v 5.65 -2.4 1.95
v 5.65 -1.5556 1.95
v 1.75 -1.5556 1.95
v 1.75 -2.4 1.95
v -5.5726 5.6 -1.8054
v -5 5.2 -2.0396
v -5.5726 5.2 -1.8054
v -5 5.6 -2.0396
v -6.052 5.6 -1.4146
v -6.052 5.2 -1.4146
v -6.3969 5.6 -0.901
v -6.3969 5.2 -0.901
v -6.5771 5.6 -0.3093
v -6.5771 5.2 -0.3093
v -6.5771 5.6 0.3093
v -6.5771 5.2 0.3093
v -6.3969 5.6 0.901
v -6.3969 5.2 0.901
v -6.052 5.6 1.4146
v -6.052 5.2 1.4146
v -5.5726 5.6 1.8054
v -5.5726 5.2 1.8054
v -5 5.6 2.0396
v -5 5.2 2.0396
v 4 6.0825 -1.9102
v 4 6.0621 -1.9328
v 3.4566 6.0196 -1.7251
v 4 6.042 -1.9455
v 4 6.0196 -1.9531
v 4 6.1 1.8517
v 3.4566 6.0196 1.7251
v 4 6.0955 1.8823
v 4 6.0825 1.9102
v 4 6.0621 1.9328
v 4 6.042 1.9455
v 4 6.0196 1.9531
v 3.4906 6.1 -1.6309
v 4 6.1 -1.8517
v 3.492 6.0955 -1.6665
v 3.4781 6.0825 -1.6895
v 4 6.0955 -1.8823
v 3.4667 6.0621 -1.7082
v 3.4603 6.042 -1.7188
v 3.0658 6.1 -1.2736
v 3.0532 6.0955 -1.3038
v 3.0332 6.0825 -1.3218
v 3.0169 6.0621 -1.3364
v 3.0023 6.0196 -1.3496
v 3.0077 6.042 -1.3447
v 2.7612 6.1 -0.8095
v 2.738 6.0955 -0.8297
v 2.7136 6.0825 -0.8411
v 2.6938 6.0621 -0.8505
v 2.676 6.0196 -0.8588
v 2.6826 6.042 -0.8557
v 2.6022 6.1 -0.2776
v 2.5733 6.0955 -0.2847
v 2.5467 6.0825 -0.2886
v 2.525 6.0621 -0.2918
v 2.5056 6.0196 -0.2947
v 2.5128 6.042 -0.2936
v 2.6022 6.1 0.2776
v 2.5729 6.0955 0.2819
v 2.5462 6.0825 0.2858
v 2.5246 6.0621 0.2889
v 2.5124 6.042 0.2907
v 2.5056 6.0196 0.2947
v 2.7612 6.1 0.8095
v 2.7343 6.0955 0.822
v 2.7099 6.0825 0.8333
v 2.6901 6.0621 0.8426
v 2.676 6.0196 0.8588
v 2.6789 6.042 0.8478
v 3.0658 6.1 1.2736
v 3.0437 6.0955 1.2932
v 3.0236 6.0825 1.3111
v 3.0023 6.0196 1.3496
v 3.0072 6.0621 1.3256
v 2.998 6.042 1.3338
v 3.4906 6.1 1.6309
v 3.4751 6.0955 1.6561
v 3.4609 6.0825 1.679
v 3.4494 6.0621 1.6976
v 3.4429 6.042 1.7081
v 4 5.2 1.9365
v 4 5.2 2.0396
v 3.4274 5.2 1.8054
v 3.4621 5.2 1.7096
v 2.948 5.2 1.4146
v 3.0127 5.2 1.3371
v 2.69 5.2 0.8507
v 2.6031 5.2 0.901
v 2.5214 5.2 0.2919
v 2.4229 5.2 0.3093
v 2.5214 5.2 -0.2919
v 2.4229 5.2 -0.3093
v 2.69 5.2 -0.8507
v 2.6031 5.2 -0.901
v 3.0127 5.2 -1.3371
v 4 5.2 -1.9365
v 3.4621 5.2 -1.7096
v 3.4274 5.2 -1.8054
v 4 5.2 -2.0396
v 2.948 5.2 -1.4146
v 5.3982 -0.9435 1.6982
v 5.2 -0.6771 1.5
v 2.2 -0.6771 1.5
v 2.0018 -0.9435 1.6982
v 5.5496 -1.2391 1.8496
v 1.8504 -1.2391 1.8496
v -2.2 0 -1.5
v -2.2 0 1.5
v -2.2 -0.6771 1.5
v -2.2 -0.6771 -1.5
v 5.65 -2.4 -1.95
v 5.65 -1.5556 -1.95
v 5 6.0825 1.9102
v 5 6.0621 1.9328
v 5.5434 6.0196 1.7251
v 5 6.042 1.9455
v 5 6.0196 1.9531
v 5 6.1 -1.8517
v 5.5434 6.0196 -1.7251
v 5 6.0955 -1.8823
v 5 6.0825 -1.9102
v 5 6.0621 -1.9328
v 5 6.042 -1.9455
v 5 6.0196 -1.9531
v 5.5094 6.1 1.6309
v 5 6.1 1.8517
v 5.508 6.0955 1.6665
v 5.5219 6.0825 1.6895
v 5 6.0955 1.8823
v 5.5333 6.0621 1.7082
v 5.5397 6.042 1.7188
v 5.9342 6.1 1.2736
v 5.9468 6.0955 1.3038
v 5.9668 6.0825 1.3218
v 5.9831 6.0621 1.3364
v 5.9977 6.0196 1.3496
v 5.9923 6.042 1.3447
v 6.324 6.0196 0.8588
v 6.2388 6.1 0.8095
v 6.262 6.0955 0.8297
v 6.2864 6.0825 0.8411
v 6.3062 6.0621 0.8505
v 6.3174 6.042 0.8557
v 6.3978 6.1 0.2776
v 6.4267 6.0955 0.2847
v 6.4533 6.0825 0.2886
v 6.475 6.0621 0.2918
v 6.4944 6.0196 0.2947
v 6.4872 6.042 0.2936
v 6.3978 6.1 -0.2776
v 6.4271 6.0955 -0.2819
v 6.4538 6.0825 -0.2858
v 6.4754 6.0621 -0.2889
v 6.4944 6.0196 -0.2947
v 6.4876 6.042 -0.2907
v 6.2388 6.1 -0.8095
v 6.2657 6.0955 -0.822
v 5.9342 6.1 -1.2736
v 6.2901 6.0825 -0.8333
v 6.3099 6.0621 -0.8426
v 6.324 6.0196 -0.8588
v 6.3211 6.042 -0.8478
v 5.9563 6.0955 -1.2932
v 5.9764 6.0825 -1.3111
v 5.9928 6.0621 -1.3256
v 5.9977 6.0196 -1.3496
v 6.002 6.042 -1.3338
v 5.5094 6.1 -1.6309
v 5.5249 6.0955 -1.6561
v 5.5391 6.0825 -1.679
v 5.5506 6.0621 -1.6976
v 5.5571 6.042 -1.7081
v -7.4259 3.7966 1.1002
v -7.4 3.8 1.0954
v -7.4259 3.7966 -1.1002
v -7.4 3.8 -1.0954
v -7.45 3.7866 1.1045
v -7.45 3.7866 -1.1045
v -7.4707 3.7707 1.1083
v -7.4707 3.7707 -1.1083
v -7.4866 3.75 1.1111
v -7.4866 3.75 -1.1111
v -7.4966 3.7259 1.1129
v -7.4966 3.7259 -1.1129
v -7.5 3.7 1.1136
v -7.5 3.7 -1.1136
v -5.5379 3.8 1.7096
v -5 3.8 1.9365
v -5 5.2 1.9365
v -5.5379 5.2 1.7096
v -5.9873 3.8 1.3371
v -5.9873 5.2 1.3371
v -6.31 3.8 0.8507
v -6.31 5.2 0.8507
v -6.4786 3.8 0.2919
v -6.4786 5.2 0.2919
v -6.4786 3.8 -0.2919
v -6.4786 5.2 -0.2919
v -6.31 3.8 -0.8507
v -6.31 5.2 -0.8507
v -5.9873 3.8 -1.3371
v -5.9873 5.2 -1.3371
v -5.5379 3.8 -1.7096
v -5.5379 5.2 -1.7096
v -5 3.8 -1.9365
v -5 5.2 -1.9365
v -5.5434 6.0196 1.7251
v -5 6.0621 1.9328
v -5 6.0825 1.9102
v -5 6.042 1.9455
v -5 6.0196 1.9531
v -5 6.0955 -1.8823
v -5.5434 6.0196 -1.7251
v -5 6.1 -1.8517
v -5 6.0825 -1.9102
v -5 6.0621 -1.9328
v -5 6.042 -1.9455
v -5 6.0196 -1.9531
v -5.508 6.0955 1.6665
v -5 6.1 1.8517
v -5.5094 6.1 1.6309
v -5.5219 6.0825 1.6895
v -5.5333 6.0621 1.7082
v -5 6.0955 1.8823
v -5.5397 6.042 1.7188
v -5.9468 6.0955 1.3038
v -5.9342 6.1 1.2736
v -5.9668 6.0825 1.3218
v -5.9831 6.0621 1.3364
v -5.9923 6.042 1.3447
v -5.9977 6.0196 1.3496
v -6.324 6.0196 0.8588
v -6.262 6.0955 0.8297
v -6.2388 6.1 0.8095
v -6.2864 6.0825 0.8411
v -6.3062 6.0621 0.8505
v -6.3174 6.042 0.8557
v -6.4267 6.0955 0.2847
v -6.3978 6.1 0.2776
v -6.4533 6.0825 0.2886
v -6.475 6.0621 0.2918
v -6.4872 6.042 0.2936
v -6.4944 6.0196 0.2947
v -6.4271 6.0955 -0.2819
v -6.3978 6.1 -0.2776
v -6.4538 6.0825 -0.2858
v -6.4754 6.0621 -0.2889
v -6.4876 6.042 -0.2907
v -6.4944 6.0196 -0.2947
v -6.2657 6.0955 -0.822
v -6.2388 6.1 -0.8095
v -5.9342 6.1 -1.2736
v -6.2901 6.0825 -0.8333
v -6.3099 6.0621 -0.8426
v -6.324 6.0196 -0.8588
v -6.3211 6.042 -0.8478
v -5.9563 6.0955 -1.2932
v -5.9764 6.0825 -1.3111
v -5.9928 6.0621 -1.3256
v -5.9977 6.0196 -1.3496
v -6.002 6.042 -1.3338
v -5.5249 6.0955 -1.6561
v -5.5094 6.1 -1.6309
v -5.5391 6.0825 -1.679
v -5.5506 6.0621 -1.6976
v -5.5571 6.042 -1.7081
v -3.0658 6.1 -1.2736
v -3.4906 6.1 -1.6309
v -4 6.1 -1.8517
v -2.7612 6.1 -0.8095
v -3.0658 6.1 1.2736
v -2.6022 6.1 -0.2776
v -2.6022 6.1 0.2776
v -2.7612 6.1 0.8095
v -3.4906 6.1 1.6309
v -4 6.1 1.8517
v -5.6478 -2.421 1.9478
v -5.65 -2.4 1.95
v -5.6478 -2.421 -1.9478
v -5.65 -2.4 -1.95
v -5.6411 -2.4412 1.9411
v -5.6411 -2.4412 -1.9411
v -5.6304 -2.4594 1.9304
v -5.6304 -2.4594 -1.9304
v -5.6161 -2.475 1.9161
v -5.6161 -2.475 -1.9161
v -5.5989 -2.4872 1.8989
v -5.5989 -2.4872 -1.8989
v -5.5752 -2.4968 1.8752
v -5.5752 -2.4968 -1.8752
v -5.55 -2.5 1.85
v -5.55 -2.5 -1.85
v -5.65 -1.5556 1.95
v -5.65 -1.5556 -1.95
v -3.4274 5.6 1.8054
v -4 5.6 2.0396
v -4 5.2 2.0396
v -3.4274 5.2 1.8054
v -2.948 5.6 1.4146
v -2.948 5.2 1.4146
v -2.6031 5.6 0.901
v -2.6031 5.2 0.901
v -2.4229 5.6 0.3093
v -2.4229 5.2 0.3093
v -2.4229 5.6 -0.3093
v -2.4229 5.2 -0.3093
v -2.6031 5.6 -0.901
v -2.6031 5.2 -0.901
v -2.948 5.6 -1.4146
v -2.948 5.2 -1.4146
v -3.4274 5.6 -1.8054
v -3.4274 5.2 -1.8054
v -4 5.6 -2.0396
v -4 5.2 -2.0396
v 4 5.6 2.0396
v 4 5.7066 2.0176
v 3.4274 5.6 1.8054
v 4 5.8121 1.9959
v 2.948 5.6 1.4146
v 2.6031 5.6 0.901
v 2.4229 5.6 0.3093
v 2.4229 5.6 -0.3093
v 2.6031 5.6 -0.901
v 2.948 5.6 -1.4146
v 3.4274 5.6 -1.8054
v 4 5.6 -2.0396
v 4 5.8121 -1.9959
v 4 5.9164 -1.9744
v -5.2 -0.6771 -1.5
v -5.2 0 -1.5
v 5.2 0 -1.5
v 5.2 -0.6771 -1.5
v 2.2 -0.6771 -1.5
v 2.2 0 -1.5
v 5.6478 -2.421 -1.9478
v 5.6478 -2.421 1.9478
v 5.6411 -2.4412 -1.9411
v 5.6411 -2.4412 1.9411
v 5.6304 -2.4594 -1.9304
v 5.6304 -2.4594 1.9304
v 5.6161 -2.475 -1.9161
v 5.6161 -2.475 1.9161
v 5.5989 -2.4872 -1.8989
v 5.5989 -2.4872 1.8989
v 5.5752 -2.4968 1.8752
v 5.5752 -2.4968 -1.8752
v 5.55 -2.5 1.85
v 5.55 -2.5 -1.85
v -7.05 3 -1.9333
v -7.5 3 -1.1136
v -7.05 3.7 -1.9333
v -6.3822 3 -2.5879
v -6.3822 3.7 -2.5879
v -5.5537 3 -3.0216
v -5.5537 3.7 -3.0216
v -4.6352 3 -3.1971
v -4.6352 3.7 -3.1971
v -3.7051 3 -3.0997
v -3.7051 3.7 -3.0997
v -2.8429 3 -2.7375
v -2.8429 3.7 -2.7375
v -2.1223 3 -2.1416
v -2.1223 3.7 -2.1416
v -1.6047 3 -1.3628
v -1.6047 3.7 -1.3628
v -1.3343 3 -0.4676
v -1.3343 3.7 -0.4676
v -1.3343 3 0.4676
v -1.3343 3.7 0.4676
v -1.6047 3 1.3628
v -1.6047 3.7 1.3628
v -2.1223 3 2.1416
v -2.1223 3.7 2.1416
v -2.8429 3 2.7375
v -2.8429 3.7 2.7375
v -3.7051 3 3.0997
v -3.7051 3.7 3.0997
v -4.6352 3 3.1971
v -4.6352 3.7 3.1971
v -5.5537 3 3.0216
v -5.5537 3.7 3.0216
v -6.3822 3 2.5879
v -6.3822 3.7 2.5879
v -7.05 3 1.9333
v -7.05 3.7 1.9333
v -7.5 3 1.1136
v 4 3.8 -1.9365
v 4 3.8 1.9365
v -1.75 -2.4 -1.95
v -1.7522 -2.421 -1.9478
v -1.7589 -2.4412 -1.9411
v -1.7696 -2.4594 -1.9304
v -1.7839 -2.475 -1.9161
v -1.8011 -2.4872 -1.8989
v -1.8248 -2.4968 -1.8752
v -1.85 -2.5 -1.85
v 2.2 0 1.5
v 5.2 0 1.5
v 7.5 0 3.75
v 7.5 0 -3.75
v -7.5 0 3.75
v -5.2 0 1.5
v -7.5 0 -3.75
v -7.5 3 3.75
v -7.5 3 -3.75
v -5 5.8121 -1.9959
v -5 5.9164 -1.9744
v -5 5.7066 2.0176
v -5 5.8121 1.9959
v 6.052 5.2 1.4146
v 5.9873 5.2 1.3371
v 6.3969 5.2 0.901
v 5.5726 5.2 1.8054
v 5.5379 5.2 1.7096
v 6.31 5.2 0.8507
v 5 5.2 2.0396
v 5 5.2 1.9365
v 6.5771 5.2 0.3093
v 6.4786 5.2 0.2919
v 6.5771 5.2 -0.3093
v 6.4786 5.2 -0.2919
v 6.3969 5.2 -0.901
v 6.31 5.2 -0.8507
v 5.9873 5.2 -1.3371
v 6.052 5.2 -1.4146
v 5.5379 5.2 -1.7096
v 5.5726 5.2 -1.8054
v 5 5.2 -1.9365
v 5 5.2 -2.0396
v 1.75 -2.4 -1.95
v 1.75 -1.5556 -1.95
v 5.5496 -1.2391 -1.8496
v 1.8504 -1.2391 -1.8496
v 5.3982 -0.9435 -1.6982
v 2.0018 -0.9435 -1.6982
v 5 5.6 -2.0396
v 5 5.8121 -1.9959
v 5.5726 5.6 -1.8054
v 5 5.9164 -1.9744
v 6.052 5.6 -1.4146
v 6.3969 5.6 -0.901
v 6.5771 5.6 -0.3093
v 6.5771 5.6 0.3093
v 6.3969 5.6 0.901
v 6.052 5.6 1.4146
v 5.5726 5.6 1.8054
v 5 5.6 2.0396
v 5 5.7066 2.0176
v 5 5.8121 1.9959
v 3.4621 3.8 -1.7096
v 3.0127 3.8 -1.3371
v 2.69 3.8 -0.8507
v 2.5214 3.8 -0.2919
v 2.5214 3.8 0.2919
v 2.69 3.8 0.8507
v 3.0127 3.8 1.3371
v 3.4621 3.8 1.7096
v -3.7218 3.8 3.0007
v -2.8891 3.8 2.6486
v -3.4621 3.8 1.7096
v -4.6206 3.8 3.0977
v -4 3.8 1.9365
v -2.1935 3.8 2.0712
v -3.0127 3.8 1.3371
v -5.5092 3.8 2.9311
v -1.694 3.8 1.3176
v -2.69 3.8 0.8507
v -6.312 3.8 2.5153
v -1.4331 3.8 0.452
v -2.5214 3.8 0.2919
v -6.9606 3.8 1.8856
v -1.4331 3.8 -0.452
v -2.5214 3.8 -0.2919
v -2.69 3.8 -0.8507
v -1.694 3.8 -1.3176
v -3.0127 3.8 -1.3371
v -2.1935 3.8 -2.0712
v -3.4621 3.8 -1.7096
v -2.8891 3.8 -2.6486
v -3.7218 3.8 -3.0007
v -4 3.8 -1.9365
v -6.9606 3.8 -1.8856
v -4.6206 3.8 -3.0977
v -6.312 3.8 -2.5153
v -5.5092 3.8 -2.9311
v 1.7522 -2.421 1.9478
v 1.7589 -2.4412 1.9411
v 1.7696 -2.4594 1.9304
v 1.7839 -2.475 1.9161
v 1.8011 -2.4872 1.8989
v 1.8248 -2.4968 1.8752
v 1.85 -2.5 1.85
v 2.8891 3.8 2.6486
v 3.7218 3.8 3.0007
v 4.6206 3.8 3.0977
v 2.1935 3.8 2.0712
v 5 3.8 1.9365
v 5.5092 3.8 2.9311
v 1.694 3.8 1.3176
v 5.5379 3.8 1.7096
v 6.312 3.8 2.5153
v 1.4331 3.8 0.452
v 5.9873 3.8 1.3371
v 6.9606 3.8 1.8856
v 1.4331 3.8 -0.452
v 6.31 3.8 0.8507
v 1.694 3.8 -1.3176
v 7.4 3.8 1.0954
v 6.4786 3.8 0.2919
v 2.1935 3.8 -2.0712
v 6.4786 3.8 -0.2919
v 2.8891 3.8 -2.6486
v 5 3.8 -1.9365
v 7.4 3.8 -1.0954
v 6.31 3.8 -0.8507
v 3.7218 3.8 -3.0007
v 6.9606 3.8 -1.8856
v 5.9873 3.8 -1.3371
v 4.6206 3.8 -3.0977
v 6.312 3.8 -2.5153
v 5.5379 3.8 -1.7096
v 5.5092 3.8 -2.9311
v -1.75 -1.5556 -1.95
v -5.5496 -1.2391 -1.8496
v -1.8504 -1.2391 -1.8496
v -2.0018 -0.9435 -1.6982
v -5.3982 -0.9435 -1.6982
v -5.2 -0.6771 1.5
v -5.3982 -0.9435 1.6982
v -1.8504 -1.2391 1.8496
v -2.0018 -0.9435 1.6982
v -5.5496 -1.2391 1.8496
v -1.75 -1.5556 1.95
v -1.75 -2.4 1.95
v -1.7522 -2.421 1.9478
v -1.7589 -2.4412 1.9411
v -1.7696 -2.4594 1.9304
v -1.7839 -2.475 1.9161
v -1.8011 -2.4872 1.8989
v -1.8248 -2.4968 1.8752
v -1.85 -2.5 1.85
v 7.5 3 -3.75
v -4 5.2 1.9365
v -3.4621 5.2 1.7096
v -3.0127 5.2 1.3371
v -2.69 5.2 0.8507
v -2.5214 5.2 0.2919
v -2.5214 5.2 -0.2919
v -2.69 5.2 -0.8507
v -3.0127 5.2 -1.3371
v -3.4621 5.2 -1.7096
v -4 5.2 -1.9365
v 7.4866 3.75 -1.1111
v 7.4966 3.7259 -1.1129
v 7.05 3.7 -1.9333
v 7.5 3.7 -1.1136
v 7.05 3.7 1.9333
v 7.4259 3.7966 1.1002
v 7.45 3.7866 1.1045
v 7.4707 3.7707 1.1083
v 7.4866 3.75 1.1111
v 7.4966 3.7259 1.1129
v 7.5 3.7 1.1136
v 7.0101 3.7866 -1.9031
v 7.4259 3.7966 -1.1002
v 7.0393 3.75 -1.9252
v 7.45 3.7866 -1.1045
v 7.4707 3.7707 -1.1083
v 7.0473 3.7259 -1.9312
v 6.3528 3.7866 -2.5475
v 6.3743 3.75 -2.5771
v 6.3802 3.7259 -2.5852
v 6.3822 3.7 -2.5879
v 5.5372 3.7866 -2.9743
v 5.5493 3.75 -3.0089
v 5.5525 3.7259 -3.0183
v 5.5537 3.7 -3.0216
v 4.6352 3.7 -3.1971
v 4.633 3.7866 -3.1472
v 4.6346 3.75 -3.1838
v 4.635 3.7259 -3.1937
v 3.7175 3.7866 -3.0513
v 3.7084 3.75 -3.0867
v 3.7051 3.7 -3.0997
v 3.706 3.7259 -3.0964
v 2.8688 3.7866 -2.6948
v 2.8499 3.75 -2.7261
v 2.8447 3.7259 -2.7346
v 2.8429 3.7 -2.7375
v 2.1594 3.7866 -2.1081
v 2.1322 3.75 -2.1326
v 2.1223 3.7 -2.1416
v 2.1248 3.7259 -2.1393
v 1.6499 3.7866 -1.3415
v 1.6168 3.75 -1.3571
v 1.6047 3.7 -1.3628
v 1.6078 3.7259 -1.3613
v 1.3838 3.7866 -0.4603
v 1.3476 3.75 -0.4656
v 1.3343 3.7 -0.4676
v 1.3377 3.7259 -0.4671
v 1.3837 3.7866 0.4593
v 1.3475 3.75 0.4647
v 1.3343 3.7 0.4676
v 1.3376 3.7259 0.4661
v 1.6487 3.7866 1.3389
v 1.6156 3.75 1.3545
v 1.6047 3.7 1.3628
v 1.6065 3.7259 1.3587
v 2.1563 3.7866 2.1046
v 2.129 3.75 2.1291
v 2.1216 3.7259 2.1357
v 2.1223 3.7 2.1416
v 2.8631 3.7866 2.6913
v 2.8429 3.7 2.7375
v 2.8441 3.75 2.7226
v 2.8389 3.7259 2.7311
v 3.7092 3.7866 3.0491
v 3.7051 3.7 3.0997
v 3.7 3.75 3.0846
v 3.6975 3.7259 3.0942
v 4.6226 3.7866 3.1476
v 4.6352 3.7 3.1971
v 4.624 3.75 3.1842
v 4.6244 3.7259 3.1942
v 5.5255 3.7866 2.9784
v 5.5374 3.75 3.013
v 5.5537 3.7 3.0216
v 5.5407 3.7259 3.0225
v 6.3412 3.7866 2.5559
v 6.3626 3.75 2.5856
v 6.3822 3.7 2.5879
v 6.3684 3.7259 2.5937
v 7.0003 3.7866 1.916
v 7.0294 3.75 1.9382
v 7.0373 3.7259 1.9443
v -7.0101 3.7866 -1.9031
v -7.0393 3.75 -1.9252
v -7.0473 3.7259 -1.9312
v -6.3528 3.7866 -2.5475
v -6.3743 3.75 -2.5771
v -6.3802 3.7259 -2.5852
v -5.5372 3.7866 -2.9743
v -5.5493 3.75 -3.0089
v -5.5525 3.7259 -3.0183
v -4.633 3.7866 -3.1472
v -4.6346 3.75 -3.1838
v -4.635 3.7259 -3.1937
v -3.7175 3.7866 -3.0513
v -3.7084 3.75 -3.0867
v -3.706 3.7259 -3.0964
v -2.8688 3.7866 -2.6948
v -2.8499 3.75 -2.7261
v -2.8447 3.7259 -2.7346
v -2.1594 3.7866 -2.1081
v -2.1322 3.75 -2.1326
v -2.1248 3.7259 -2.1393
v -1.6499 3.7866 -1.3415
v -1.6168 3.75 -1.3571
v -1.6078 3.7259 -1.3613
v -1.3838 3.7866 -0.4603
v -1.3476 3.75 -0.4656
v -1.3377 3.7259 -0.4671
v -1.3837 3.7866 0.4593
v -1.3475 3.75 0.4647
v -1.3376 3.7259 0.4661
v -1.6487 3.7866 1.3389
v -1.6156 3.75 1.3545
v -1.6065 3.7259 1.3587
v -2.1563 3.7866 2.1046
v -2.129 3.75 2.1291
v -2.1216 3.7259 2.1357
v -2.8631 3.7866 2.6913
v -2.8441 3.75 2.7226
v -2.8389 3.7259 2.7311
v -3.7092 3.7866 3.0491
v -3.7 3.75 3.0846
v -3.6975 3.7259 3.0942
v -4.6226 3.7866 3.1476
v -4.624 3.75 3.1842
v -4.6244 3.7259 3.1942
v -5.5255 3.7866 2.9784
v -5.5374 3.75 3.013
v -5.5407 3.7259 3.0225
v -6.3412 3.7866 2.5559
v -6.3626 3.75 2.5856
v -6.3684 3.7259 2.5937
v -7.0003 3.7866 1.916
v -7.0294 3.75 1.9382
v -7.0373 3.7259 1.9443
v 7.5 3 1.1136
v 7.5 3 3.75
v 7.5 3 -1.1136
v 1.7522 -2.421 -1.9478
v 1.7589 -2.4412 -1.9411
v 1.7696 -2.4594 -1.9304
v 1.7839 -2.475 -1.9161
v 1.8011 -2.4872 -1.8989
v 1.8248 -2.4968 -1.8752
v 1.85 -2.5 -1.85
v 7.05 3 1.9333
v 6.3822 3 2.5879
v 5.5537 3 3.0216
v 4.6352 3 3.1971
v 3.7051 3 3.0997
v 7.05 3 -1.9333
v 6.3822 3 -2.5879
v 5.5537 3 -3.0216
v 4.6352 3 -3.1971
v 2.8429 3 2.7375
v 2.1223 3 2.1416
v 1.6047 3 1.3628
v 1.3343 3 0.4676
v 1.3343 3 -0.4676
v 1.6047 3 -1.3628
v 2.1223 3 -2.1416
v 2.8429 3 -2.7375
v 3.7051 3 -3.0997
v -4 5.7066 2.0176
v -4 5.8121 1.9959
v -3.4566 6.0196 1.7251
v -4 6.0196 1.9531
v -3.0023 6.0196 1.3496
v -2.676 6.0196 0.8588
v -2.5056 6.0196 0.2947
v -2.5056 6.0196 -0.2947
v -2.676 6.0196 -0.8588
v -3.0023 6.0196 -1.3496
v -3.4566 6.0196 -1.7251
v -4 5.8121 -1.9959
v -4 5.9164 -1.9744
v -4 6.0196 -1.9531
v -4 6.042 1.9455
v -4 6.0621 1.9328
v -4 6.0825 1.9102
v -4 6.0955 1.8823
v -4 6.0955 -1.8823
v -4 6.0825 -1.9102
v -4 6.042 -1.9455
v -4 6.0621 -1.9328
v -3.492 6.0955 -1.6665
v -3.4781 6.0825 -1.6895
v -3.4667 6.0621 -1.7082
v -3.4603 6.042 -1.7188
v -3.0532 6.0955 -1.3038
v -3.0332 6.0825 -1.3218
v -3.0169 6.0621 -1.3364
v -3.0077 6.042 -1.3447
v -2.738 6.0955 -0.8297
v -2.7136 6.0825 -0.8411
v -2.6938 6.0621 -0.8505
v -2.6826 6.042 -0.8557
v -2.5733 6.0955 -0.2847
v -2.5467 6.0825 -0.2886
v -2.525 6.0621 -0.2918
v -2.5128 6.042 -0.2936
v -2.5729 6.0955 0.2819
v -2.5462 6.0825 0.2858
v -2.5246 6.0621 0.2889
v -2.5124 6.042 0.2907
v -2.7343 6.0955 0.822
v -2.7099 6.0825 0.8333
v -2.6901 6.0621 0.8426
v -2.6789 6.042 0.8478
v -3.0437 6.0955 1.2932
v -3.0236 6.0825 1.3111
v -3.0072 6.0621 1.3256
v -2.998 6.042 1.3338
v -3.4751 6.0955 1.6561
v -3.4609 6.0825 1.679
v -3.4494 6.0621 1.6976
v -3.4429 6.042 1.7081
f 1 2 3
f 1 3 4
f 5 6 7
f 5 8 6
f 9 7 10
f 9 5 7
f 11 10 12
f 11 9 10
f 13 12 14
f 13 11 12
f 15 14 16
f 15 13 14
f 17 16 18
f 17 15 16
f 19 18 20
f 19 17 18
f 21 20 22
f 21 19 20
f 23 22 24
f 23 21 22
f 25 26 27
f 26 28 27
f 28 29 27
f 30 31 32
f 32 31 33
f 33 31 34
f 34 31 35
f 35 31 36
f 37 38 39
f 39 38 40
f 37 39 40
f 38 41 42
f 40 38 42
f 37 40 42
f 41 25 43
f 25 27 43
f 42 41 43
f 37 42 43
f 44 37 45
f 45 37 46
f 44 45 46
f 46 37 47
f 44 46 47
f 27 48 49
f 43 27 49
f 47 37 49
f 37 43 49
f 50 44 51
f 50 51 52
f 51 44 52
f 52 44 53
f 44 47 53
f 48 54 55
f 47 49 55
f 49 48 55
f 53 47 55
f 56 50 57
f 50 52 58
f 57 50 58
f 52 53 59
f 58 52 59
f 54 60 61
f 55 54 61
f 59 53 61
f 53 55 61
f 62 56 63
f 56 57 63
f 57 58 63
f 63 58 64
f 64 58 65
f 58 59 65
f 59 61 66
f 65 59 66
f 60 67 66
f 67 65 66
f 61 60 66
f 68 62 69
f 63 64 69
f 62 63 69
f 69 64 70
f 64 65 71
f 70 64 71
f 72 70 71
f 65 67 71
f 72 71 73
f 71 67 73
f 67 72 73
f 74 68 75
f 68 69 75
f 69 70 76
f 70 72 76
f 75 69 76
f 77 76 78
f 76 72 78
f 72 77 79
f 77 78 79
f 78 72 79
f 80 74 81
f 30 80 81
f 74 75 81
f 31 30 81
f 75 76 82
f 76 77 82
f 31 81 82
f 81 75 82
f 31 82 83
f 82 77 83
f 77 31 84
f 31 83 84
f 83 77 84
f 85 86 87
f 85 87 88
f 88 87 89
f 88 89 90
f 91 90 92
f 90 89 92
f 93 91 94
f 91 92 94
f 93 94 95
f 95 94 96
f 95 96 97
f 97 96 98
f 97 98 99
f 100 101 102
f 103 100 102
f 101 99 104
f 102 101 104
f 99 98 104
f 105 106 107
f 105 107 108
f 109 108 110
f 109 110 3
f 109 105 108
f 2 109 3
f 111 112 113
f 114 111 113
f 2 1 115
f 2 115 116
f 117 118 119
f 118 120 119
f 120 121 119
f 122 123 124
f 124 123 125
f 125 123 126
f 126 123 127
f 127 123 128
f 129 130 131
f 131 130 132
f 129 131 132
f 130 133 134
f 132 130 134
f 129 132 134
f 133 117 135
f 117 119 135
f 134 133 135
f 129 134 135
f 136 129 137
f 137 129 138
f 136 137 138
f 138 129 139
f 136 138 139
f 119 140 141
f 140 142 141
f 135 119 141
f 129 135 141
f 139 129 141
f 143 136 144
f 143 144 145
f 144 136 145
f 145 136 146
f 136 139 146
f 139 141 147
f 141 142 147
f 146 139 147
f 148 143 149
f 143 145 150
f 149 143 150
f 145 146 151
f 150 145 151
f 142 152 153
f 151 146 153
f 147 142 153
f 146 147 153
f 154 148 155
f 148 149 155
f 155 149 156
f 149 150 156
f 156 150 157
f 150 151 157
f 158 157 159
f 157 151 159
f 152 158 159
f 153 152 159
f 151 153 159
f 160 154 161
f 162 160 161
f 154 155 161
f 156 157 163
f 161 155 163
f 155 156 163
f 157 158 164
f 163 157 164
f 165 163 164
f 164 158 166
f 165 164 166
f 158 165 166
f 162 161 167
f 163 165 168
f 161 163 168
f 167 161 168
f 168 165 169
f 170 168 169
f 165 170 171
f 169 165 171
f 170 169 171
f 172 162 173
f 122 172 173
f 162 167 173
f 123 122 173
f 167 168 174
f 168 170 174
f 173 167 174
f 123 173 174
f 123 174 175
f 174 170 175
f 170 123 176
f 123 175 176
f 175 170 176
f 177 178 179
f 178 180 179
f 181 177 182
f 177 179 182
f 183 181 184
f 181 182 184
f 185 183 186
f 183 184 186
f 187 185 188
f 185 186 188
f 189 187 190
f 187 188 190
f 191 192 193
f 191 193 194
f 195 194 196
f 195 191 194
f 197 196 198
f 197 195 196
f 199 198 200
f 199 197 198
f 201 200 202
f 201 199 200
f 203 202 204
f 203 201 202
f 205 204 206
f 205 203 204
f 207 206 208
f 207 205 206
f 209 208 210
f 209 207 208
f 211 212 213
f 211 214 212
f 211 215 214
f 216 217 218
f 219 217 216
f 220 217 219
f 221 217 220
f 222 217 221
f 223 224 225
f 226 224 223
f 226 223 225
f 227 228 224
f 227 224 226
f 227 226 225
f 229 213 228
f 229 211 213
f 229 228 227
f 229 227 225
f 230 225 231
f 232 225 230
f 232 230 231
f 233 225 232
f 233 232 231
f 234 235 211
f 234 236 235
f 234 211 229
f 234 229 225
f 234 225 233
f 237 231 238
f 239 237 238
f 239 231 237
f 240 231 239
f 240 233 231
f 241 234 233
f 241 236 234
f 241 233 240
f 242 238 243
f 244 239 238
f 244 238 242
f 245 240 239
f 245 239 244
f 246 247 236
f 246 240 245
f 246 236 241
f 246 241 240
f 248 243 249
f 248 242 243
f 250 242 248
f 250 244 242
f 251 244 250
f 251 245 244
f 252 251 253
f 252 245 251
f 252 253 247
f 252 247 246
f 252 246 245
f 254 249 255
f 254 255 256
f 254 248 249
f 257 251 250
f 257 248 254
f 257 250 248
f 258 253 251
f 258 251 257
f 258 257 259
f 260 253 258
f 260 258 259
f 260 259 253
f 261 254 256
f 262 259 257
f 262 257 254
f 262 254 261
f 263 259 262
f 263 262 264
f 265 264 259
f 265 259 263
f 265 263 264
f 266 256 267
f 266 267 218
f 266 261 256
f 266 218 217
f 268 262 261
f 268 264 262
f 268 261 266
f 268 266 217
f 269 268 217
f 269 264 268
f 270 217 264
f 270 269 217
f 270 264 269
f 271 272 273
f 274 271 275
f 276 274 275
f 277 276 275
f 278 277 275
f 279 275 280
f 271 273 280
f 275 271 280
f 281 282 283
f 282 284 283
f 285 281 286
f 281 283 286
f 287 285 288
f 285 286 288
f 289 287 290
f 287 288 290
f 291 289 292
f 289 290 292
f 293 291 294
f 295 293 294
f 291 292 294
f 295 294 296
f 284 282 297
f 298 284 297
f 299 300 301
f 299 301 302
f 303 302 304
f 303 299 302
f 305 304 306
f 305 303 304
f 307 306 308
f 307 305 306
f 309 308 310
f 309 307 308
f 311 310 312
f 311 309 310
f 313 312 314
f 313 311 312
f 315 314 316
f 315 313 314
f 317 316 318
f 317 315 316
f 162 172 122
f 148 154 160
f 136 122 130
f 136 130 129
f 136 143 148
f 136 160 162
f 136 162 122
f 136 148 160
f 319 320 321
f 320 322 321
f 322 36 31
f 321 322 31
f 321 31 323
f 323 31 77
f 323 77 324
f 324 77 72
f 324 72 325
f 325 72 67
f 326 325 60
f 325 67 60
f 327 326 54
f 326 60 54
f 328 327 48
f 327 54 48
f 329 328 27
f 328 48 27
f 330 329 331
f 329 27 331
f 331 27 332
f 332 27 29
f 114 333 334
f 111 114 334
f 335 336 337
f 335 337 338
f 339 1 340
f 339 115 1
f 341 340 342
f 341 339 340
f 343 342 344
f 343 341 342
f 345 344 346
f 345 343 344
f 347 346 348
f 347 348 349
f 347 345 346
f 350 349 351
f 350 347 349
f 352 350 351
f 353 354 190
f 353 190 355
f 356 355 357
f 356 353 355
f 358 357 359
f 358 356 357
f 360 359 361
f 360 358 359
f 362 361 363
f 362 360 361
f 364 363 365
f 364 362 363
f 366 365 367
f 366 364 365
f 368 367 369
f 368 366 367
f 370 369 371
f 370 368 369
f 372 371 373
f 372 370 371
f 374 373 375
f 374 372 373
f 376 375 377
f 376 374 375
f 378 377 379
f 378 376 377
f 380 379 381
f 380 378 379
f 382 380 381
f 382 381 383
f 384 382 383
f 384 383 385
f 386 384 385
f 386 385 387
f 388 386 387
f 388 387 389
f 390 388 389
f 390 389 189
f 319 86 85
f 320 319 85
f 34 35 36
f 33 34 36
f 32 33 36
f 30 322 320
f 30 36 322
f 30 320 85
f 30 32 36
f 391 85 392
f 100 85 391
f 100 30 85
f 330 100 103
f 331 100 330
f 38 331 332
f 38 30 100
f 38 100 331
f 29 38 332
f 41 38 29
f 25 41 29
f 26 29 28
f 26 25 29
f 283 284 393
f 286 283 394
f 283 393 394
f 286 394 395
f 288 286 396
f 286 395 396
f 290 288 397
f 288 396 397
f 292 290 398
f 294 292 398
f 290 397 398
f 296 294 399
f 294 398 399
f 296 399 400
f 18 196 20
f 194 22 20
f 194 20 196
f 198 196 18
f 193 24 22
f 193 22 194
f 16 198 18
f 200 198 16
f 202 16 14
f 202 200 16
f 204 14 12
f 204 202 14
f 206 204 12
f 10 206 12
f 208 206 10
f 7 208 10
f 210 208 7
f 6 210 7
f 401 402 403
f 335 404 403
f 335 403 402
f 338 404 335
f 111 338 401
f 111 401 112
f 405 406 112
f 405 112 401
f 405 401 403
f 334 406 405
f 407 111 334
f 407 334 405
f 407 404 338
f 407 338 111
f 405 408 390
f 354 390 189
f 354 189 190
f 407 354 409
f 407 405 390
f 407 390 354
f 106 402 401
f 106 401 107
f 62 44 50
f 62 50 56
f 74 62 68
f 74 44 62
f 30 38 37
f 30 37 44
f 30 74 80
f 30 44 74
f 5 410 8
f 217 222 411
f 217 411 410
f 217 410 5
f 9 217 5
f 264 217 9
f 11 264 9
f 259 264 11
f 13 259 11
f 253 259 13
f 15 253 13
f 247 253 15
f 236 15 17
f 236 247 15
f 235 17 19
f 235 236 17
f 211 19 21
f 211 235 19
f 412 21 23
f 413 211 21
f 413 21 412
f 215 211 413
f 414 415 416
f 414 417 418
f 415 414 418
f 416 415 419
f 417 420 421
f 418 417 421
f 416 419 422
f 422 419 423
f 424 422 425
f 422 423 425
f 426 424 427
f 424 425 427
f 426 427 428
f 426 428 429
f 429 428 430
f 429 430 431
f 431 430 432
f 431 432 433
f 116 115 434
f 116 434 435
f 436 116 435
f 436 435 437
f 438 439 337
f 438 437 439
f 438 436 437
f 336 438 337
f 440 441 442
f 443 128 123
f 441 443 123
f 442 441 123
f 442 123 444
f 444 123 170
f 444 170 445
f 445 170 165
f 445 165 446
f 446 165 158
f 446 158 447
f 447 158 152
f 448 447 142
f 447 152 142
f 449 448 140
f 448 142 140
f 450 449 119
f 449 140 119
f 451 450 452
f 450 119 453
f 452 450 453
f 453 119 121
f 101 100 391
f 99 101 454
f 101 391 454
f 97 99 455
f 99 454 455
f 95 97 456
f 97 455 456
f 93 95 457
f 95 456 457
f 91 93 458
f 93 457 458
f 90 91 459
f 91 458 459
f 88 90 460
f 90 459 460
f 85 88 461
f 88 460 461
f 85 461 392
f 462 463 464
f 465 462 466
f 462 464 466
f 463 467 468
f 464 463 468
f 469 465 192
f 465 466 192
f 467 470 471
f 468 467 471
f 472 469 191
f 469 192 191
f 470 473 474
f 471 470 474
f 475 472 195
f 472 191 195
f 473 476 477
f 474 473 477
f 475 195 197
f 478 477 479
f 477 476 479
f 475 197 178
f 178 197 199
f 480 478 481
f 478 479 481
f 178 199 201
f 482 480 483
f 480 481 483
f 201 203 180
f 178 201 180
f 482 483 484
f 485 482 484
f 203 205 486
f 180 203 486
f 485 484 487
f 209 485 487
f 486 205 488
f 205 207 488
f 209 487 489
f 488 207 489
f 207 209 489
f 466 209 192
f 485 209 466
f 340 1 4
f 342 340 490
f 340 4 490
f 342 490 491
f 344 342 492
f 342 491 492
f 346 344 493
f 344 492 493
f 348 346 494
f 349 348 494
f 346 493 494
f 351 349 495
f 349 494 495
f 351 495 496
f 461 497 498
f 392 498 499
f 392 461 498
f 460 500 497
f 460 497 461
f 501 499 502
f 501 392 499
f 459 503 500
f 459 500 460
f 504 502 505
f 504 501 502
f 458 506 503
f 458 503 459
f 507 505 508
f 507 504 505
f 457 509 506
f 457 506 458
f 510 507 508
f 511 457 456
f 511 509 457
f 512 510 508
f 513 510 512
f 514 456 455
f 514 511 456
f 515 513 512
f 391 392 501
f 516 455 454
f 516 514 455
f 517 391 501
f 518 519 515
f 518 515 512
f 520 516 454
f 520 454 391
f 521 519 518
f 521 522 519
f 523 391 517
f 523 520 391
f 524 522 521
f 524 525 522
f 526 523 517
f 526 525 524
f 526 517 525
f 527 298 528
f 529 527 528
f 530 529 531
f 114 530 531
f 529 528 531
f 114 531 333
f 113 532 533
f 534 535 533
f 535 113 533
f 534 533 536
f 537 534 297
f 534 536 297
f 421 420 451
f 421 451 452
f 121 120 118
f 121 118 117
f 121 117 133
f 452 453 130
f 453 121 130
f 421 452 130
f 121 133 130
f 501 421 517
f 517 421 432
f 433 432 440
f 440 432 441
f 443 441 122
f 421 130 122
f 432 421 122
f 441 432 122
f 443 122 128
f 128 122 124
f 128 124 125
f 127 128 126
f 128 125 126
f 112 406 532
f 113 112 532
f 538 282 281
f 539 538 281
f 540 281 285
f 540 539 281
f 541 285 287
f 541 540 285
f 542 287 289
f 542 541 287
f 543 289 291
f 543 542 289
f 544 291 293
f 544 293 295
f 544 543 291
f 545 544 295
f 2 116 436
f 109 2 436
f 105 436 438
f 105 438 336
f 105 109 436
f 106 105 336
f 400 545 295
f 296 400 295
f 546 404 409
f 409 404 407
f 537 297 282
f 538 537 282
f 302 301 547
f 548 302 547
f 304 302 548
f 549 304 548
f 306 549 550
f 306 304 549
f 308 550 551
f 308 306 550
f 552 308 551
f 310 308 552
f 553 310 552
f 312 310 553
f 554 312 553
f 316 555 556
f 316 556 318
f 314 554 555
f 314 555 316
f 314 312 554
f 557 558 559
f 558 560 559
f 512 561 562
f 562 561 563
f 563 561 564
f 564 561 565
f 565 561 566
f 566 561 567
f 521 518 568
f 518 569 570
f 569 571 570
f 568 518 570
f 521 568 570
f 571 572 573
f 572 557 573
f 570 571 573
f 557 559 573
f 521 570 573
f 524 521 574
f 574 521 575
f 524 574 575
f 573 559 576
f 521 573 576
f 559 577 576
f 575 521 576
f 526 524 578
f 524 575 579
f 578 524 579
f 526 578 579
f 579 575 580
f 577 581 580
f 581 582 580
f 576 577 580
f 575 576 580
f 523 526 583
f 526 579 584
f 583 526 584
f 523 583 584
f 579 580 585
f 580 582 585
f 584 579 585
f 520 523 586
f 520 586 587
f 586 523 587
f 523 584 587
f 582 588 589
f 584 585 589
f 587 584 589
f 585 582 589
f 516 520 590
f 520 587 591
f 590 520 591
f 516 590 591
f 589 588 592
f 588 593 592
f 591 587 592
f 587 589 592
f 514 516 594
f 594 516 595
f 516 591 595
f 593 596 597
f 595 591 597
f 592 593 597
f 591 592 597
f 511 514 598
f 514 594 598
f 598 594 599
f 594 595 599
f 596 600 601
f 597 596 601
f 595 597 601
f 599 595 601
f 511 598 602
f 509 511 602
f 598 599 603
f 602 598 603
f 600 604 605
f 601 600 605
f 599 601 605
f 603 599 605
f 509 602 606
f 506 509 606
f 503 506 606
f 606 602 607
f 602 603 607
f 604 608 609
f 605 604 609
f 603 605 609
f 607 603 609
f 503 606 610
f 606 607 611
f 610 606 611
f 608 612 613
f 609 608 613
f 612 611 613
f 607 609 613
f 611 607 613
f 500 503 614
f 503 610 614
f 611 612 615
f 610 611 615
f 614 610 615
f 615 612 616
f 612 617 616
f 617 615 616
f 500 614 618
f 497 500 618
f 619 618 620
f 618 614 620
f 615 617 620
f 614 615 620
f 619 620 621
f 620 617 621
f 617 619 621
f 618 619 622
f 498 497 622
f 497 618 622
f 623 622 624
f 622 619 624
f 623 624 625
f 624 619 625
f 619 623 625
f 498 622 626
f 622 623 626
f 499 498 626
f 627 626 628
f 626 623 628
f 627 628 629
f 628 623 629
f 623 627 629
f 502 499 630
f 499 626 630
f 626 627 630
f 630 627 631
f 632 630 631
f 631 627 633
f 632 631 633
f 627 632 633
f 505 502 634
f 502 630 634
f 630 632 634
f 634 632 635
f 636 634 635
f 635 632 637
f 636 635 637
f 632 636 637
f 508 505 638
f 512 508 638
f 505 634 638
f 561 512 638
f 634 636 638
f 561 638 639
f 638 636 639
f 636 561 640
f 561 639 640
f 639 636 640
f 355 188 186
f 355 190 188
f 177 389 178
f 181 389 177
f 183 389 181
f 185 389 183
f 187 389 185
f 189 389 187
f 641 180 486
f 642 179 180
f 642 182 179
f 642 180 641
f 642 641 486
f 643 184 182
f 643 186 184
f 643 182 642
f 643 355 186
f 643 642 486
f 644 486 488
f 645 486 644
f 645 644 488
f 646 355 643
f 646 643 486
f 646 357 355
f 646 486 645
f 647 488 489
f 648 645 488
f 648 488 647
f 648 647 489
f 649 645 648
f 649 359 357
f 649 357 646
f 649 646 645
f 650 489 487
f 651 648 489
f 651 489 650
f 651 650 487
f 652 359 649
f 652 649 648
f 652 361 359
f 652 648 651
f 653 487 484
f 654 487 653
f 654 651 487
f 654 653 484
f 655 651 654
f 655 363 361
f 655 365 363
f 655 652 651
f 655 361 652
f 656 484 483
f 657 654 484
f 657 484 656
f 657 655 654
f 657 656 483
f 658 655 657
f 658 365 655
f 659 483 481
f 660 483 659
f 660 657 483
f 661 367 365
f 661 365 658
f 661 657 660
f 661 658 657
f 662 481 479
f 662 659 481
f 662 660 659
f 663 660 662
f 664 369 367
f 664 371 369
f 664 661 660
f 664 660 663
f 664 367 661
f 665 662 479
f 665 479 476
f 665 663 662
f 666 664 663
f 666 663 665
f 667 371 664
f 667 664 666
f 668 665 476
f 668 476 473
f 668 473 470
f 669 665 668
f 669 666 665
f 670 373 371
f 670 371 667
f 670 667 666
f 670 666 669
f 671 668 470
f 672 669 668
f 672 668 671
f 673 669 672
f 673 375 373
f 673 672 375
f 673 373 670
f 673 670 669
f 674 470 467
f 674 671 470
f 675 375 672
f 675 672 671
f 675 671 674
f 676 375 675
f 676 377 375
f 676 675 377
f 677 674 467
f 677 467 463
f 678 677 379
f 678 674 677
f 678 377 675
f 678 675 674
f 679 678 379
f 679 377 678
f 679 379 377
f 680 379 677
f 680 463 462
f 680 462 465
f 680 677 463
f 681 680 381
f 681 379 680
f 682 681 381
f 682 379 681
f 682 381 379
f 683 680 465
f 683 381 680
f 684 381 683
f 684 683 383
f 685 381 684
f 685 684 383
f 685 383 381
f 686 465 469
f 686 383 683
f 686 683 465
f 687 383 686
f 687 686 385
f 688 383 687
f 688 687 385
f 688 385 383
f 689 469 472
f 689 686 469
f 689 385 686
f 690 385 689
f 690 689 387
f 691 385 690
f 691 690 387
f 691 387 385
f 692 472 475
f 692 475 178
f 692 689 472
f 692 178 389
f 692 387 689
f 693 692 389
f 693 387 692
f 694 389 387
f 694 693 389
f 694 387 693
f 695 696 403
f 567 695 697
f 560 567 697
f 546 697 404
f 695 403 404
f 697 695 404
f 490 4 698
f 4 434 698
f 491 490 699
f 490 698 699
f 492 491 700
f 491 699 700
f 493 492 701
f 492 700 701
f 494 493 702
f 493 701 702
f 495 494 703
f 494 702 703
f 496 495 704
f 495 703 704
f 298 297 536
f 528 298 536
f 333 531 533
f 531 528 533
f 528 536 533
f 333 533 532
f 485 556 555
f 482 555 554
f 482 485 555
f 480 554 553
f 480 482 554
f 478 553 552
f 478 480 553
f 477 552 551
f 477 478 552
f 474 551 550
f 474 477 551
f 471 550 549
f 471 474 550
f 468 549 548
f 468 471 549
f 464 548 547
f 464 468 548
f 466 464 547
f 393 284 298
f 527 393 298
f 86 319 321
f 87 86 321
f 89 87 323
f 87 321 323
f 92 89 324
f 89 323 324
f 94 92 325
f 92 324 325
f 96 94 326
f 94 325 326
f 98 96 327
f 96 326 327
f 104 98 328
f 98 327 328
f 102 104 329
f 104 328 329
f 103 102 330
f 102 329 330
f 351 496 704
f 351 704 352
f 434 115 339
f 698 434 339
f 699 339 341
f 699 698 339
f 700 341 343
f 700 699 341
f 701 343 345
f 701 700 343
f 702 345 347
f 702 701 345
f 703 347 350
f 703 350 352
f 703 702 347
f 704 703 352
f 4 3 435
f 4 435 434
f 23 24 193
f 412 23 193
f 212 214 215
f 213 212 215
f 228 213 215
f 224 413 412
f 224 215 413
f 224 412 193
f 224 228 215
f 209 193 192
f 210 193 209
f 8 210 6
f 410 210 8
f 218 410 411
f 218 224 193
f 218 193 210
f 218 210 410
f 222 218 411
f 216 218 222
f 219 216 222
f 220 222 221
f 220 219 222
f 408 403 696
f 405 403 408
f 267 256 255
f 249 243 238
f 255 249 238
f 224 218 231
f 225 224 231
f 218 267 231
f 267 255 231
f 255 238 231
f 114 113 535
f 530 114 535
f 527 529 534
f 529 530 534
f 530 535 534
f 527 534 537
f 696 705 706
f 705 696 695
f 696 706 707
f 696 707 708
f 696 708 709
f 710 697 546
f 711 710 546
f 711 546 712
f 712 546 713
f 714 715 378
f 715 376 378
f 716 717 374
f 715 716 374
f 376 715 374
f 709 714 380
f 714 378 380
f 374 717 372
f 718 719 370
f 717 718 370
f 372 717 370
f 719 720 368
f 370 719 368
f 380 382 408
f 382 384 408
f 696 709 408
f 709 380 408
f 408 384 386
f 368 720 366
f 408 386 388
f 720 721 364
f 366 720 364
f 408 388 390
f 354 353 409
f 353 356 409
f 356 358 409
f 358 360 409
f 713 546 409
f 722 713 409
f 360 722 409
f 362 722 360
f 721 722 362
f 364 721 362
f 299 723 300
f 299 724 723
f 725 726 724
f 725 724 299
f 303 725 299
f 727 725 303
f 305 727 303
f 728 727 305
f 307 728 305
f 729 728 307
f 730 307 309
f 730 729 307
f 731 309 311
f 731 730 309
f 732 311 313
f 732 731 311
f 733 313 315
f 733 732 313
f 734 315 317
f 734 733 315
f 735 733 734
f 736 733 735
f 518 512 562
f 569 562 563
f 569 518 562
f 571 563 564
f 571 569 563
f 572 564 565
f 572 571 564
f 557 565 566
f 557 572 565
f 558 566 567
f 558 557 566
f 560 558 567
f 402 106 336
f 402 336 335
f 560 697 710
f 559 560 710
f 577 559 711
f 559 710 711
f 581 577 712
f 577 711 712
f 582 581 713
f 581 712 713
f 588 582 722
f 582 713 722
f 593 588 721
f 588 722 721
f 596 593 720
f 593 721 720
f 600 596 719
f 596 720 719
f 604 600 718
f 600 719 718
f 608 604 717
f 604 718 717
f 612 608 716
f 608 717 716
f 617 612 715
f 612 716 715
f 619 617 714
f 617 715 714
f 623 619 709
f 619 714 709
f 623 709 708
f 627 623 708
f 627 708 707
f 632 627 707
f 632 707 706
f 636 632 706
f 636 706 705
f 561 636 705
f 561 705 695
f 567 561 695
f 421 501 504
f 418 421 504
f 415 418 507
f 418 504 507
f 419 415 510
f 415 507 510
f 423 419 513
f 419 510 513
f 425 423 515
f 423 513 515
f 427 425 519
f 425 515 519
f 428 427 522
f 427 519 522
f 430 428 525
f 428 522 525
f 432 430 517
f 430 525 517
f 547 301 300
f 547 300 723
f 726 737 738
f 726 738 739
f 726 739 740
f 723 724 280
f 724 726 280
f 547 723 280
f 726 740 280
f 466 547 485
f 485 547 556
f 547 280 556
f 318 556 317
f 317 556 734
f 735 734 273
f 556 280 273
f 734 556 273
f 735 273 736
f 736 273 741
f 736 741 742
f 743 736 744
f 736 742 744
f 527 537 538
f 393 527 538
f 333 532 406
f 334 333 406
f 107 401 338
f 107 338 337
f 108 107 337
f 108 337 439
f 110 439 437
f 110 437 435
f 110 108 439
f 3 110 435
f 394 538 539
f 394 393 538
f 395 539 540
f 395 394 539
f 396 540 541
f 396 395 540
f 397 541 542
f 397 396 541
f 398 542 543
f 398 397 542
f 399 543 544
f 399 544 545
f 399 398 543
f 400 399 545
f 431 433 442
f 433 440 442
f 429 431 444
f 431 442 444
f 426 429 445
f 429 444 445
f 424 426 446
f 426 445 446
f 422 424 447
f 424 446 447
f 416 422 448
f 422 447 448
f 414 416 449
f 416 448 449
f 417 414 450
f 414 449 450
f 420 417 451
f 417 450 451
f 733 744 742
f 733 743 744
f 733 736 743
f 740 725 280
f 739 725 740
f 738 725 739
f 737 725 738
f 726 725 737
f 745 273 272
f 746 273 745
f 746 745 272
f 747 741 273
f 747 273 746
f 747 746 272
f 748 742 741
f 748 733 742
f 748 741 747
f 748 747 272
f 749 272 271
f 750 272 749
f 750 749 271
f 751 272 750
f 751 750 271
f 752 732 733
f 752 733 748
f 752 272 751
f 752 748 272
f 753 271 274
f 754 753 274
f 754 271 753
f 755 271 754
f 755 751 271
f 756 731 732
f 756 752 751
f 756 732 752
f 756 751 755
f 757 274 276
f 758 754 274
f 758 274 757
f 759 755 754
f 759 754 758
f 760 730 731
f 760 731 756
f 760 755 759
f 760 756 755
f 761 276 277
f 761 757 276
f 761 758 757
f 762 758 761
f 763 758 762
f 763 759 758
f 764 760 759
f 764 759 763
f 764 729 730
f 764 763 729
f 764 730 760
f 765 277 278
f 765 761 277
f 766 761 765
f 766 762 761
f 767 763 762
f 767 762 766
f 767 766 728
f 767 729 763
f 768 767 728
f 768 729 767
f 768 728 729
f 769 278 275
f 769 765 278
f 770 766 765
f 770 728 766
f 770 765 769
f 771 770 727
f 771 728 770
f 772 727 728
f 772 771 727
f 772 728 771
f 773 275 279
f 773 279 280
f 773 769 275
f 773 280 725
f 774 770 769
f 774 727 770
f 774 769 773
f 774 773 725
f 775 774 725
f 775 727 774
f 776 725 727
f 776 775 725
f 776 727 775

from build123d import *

# Parameters (mm, degrees)
SKETCH_1_W             = 7.5
SKETCH_1_H             = 7.5
EXTRUDE_1_DEPTH        = 3
EXTRUDE_2_DEPTH        = 7.5
CUT_EXTRUDE_1_DEPTH    = 7.5
SKETCH_5_R             = 3.2
EXTRUDE_3_DEPTH        = 0.8
SKETCH_6_R             = 2
EXTRUDE_4_DEPTH        = 2.3
SKETCH_8_W             = 1
SKETCH_8_H             = 6
CUT_EXTRUDE_2_DEPTH    = 2.3
SKETCH_9_W             = 1.018557721
SKETCH_9_H             = 7.5
CUT_EXTRUDE_5_DEPTH    = 0.8
FILLET_2_R             = 0.1
FILLET_2_OF_MIRROR_1_R = 0.1


with BuildPart() as part:
    # 草图1 → 凸台-拉伸1 (new body)
    with BuildSketch(Plane(origin=(0, 0, 0), x_dir=(1, 0, 0), z_dir=(0, 1, 0))):
        with Locations((3.75, 0)):
            Rectangle(SKETCH_1_W, SKETCH_1_H)
    extrude_1 = extrude(amount=EXTRUDE_1_DEPTH)

    # 草图3 → 凸台-拉伸2 (add)
    with BuildSketch(Plane.XY.offset(3.75)):
        with BuildLine():
            Line((5.2, 0), (2.2, 0))
            Line((2.2, 0), (2.2, -0.677124344))
            ThreePointArc((2.2, -0.677124344), (1.919957697, -1.088161527), (1.75, -1.555590279))
            Line((1.75, -1.555590279), (1.75, -2.5))
            Line((1.75, -2.5), (5.65, -2.5))
            Line((5.65, -2.5), (5.65, -1.555590279))
            ThreePointArc((5.65, -1.555590279), (5.480042303, -1.088161527), (5.2, -0.677124344))
            Line((5.2, -0.677124344), (5.2, 0))
        make_face()
    extrude_2 = extrude(amount=-EXTRUDE_2_DEPTH)

    # 草图4 → 切除-拉伸1 (cut)
    with BuildSketch(Plane(origin=(7.5, 0, 0), x_dir=(0, 0, -1), z_dir=(1, 0, 0))):
        with BuildLine():
            Line((1.5, 0), (3.75, 0))
            Line((3.75, 0), (3.75, -2.5))
            Line((3.75, -2.5), (1.95, -2.5))
            Line((1.95, -2.5), (1.95, -1.555590279))
            ThreePointArc((1.95, -1.555590279), (1.780042303, -1.088161527), (1.5, -0.677124344))
            Line((1.5, -0.677124344), (1.5, 0))
        make_face()
        with BuildLine():
            Line((-1.5, 0), (-1.5, -0.677124344))
            ThreePointArc((-1.5, -0.677124344), (-1.780042303, -1.088161527), (-1.95, -1.555590279))
            Line((-1.95, -1.555590279), (-1.95, -2.5))
            Line((-1.95, -2.5), (-3.75, -2.5))
            Line((-3.75, -2.5), (-3.75, 0))
            Line((-3.75, 0), (-1.5, 0))
        make_face()
    cut_extrude_1 = extrude(amount=-CUT_EXTRUDE_1_DEPTH, mode=Mode.SUBTRACT)

    # 草图5 → 凸台-拉伸3 (add)
    with BuildSketch(Plane(origin=(0, 3, 0), x_dir=(1, 0, 0), z_dir=(0, 1, 0))):
        with Locations(Location((4.5, 0, 0), (0, 0, 20.364134806))):
            Circle(SKETCH_5_R)
    extrude_3 = extrude(amount=EXTRUDE_3_DEPTH)

    # 草图6 → 凸台-拉伸4 (add)
    with BuildSketch(Plane(origin=(0, 3.8, 0), x_dir=(1, 0, 0), z_dir=(0, 1, 0))):
        with Locations(Location((4.5, 0, 0), (0, 0, 270))):
            Circle(SKETCH_6_R)
    extrude_4 = extrude(amount=EXTRUDE_4_DEPTH)

    # 草图7 → 旋转1 (revolve)
    with BuildSketch(Plane.XY, mode=Mode.PRIVATE) as revolve_1_sk:
        Polygon((2.5, 6.1), (2.5, 5.2), (2.4, 5.2), (2.4, 5.6), align=None)
    revolve_1 = revolve(revolve_1_sk.sketch.rotate(Axis((4.5, 6.1, 0), (0, -1, 0)), 270), axis=Axis((4.5, 6.1, 0), (0, -1, 0)))

    # 草图8 → 切除-拉伸2 (cut)
    with BuildSketch(Plane(origin=(0, 6.1, 0), x_dir=(1, 0, 0), z_dir=(0, 1, 0))):
        with Locations((4.5, 0)):
            Rectangle(SKETCH_8_W, SKETCH_8_H)
    cut_extrude_2 = extrude(amount=-CUT_EXTRUDE_2_DEPTH, mode=Mode.SUBTRACT)

    # 草图9 → 切除-拉伸5 (cut)
    with BuildSketch(Plane(origin=(0, 3, 0), x_dir=(1, 0, 0), z_dir=(0, 1, 0))):
        with Locations((8.009278861, 0)):
            Rectangle(SKETCH_9_W, SKETCH_9_H)
    cut_extrude_5 = extrude(amount=CUT_EXTRUDE_5_DEPTH, mode=Mode.SUBTRACT)

    # 圆角2
    fillet_2_edges = [part.edges().sort_by_distance(p)[0] for p in [
        (5.65, -2.5, 0),
        (3.7, -2.5, -1.95),
        (1.75, -2.5, 0),
        (3.7, -2.5, 1.95),
        (7.5, 3.8, 0),
        (1.3, 3.8, 0),
        (2.5, 6.1, 0),
        (6.5, 6.1, 0),
    ]]
    fillet(fillet_2_edges, radius=FILLET_2_R)

    # 镜向1: 凸台-拉伸1, 凸台-拉伸2, 切除-拉伸1, 凸台-拉伸3, 凸台-拉伸4, 旋转1, 切除-拉伸2, 切除-拉伸5 across plane
    add(extrude_1.mirror(Plane(origin=(0, 0, 0), x_dir=(0, 0, 1), z_dir=(1, 0, 0))))
    add(extrude_2.mirror(Plane(origin=(0, 0, 0), x_dir=(0, 0, 1), z_dir=(1, 0, 0))))
    add(cut_extrude_1.mirror(Plane(origin=(0, 0, 0), x_dir=(0, 0, 1), z_dir=(1, 0, 0))), mode=Mode.SUBTRACT)
    add(extrude_3.mirror(Plane(origin=(0, 0, 0), x_dir=(0, 0, 1), z_dir=(1, 0, 0))))
    add(extrude_4.mirror(Plane(origin=(0, 0, 0), x_dir=(0, 0, 1), z_dir=(1, 0, 0))))
    add(revolve_1.mirror(Plane(origin=(0, 0, 0), x_dir=(0, 0, 1), z_dir=(1, 0, 0))))
    add(cut_extrude_2.mirror(Plane(origin=(0, 0, 0), x_dir=(0, 0, 1), z_dir=(1, 0, 0))), mode=Mode.SUBTRACT)
    add(cut_extrude_5.mirror(Plane(origin=(0, 0, 0), x_dir=(0, 0, 1), z_dir=(1, 0, 0))), mode=Mode.SUBTRACT)

    # 圆角2 of 镜向1
    fillet_2_of_mirror_1_edges = [part.edges().sort_by_distance(p)[0] for p in [
        (-5.65, -2.5, 0),
        (-3.7, -2.5, -1.95),
        (-1.75, -2.5, 0),
        (-3.7, -2.5, 1.95),
        (-7.5, 3.8, 0),
        (-1.3, 3.8, 0),
        (-2.5, 6.1, 0),
        (-6.5, 6.1, 0),
    ]]
    fillet(fillet_2_of_mirror_1_edges, radius=FILLET_2_OF_MIRROR_1_R)


solid = part.part
